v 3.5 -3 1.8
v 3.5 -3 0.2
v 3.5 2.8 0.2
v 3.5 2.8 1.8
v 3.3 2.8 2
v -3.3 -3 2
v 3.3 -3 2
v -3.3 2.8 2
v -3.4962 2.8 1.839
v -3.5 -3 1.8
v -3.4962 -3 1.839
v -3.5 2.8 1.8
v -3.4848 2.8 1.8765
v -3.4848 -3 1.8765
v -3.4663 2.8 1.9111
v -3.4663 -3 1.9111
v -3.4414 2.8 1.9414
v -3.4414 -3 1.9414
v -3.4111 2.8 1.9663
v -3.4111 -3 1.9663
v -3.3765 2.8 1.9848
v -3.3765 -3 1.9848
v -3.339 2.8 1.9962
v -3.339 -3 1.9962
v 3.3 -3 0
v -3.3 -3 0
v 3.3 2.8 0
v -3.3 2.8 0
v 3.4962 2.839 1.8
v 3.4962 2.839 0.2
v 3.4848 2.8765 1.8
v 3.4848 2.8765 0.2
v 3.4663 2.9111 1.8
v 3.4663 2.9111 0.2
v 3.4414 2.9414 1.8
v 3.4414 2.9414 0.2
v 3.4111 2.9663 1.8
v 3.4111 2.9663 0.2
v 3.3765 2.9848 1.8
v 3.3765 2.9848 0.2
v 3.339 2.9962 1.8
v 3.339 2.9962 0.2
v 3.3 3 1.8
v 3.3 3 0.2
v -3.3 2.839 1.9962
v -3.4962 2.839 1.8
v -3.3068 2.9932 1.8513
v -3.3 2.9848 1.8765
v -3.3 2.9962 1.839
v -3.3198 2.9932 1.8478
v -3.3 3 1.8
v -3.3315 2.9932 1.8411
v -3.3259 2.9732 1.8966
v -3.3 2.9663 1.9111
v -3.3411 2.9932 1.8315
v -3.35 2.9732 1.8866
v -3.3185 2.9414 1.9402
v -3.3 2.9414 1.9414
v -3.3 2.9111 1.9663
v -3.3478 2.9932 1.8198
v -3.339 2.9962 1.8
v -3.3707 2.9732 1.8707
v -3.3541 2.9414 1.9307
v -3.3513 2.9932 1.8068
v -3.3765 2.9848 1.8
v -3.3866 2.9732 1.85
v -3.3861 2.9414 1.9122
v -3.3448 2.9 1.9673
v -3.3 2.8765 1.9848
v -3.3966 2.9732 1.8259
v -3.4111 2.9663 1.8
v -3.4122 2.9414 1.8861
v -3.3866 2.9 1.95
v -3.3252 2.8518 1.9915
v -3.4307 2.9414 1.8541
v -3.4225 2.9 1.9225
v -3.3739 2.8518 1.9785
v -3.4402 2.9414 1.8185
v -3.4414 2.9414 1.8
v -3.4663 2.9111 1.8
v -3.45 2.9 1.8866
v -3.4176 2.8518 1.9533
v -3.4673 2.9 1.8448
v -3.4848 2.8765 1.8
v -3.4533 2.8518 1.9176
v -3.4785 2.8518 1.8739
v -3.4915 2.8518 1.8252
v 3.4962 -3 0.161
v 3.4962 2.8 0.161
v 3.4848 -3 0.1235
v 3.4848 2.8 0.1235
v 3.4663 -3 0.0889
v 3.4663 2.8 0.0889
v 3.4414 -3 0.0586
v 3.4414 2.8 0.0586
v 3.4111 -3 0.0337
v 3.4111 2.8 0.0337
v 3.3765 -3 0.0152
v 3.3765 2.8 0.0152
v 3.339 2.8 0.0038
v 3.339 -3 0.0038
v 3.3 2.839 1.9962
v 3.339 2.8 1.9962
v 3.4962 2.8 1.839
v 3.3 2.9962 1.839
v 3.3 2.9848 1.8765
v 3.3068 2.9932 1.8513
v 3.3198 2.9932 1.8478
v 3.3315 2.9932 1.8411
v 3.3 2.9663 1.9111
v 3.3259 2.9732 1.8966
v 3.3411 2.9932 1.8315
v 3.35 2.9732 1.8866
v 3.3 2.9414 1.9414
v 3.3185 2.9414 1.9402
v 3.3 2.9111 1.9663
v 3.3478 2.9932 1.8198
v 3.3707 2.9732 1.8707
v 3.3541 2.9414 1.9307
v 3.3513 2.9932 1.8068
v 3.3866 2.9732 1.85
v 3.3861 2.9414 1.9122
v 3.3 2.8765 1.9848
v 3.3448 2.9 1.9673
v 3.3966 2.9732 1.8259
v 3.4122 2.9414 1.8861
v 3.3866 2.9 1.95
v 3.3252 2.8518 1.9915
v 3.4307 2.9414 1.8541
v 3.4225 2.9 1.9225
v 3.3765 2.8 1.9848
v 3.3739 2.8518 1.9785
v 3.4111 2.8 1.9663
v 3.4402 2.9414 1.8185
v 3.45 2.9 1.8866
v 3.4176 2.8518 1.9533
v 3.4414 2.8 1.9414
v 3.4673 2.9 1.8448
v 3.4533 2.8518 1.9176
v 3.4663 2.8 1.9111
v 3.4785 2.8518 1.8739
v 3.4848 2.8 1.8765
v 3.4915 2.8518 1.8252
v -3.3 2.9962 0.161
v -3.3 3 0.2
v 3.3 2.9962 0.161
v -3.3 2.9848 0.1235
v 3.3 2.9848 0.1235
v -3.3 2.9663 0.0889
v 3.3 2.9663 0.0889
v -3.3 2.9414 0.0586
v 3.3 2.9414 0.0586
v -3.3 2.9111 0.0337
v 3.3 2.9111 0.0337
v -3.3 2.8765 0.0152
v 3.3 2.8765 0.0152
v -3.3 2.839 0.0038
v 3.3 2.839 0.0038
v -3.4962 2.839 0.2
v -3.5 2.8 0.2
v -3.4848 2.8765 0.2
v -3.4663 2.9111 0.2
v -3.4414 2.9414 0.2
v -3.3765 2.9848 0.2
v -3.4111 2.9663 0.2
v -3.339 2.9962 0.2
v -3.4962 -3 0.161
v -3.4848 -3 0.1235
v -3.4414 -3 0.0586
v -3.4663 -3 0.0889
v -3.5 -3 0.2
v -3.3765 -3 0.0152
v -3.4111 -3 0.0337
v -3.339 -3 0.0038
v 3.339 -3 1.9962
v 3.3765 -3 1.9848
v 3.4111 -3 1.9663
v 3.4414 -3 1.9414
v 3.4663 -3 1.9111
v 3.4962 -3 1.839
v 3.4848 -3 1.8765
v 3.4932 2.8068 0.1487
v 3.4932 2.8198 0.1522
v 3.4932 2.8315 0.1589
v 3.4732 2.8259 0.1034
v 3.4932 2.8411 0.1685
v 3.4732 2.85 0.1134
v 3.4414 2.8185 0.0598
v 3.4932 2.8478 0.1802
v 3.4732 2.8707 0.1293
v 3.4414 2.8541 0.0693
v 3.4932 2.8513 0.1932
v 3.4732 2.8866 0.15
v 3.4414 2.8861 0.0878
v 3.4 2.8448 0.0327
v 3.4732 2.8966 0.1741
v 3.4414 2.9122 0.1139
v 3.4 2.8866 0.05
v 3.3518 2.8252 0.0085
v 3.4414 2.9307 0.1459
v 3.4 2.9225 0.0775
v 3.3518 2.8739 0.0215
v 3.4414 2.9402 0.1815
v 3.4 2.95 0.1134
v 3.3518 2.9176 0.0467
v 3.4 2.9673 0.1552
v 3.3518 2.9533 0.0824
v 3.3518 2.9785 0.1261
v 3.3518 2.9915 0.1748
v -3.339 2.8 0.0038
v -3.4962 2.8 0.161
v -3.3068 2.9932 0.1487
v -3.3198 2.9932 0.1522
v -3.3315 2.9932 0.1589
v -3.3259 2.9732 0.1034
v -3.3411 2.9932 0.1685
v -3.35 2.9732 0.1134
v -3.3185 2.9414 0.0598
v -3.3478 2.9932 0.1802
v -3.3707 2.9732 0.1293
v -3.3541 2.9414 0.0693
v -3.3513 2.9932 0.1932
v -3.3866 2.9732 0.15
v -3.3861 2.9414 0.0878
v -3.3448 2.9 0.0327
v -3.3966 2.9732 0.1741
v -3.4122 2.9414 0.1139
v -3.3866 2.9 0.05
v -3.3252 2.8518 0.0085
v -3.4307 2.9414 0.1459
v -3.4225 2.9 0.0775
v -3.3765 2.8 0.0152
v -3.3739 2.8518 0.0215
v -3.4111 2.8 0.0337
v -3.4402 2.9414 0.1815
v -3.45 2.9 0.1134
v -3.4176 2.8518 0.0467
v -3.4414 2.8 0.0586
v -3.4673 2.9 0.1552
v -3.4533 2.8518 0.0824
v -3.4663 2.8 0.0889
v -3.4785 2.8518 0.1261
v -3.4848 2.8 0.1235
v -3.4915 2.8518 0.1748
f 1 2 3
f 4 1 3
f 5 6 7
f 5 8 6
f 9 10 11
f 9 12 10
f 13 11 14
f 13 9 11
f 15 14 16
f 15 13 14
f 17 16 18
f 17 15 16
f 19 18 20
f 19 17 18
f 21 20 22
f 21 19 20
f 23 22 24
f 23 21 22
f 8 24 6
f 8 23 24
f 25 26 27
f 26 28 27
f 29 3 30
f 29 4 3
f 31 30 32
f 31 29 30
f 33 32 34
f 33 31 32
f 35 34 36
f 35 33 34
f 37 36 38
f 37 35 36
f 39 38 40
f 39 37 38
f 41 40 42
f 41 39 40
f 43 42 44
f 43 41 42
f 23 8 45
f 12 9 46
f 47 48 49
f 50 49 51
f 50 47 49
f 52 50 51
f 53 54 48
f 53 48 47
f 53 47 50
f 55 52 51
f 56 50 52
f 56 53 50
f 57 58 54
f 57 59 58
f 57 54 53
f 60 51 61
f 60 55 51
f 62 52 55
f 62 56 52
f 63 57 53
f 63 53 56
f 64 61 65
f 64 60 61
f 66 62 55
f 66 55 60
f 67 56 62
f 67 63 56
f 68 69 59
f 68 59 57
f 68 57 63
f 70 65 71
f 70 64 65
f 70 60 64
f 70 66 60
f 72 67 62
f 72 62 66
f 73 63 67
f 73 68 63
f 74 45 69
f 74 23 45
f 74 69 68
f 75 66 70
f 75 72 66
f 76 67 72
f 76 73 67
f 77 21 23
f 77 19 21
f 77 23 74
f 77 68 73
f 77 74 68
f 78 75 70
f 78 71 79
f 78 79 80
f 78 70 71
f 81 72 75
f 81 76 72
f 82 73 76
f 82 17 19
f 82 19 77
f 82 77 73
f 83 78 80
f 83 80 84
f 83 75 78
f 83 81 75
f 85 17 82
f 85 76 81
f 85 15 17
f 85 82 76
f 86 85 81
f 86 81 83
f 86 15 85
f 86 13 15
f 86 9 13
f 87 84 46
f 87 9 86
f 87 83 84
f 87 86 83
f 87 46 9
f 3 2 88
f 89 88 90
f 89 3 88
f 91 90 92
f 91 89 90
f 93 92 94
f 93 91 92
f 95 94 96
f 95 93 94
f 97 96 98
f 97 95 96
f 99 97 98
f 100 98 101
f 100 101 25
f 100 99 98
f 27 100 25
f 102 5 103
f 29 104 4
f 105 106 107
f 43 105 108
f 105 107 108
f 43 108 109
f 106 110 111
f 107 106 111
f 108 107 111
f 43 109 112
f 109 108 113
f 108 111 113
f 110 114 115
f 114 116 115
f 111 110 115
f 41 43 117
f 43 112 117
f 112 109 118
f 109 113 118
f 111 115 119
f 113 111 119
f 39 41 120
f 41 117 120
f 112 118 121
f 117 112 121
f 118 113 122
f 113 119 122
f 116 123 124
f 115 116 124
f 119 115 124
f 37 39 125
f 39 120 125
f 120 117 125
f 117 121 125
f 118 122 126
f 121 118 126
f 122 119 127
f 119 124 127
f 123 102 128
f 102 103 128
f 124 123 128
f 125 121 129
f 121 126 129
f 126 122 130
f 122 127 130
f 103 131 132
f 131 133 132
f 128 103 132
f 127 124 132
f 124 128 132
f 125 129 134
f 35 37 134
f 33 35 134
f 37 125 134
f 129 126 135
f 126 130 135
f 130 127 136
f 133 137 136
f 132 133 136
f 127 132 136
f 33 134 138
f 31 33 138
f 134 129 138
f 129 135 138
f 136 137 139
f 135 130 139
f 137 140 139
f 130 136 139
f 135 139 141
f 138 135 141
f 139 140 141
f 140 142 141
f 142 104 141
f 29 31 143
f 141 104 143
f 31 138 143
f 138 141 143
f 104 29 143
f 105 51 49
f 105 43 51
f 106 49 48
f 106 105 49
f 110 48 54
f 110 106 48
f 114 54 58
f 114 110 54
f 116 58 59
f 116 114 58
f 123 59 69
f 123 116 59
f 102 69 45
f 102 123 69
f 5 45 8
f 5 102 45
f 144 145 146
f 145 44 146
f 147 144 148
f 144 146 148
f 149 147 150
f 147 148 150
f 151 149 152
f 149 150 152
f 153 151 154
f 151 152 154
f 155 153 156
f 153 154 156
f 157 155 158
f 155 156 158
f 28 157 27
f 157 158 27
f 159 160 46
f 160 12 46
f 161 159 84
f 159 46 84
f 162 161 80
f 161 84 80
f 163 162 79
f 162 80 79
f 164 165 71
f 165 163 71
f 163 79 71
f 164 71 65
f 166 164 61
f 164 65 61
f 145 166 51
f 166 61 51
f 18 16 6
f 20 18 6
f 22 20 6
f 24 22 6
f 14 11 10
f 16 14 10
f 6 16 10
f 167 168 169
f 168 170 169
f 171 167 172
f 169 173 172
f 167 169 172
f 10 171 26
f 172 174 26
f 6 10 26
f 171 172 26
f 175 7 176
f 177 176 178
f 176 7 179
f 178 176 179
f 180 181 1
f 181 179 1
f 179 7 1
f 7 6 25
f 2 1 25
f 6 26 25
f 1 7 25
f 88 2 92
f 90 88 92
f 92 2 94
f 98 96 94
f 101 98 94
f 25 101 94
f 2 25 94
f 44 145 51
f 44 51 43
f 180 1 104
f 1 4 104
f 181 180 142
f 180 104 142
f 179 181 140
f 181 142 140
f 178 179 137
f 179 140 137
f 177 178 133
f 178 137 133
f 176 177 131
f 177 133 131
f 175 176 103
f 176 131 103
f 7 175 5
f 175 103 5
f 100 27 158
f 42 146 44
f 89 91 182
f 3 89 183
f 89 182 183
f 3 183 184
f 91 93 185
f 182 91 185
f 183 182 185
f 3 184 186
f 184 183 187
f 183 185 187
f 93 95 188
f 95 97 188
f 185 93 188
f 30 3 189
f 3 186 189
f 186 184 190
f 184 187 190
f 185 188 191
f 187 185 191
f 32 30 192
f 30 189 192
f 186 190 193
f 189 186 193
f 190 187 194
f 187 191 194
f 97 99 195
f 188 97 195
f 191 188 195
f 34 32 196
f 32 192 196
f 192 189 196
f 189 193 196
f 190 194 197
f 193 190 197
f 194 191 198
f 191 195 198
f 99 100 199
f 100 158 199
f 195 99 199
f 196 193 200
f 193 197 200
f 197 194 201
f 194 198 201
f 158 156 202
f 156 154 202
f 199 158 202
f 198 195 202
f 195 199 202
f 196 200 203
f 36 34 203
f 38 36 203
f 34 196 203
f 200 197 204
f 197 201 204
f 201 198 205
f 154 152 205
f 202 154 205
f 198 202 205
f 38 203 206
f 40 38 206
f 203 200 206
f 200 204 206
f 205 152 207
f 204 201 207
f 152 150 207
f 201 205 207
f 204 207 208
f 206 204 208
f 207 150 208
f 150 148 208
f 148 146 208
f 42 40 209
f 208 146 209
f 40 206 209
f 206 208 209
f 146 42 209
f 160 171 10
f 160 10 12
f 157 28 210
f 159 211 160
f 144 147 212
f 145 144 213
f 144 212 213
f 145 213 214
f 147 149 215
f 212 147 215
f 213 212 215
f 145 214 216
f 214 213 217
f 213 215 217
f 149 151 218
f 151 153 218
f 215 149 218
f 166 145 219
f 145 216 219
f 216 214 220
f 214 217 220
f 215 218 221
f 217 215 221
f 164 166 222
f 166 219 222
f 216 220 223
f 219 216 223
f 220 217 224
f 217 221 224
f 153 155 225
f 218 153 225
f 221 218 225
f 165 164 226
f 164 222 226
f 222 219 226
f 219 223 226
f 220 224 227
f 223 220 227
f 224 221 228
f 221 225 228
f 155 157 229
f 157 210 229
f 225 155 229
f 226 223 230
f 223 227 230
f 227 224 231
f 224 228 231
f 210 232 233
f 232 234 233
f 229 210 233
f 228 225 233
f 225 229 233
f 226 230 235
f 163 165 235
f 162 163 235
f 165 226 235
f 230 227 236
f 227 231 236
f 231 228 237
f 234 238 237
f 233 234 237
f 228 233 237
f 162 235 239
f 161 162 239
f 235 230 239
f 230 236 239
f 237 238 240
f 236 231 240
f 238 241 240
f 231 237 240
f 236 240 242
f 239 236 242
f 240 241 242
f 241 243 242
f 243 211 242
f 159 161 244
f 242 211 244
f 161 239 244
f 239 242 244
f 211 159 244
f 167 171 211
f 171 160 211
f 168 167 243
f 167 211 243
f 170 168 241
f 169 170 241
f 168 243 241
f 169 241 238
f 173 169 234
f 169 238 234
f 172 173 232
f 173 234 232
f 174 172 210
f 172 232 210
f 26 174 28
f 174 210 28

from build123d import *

# Parameters (mm, degrees)
SKETCH_1_W      = 7
SKETCH_1_H      = 6
EXTRUDE_1_DEPTH = 2
FILLET_1_R      = 0.2


with BuildPart() as part:
    # 草圖1 → 伸長1 (new body)
    with BuildSketch(Plane.XY):
        Rectangle(SKETCH_1_W, SKETCH_1_H)
    extrude(amount=EXTRUDE_1_DEPTH)

    # 圓角1
    fillet_1_edges = [part.edges().sort_by_distance(p)[0] for p in [
        (-3.5, 0, 2),
        (3.5, 0, 2),
        (-3.5, 0, 0),
        (0, 3, 0),
        (3.5, 0, 0),
        (0, 3, 2),
        (-3.5, 3, 1),
        (3.5, 3, 1),
    ]]
    fillet(fillet_1_edges, radius=FILLET_1_R)


solid = part.part
